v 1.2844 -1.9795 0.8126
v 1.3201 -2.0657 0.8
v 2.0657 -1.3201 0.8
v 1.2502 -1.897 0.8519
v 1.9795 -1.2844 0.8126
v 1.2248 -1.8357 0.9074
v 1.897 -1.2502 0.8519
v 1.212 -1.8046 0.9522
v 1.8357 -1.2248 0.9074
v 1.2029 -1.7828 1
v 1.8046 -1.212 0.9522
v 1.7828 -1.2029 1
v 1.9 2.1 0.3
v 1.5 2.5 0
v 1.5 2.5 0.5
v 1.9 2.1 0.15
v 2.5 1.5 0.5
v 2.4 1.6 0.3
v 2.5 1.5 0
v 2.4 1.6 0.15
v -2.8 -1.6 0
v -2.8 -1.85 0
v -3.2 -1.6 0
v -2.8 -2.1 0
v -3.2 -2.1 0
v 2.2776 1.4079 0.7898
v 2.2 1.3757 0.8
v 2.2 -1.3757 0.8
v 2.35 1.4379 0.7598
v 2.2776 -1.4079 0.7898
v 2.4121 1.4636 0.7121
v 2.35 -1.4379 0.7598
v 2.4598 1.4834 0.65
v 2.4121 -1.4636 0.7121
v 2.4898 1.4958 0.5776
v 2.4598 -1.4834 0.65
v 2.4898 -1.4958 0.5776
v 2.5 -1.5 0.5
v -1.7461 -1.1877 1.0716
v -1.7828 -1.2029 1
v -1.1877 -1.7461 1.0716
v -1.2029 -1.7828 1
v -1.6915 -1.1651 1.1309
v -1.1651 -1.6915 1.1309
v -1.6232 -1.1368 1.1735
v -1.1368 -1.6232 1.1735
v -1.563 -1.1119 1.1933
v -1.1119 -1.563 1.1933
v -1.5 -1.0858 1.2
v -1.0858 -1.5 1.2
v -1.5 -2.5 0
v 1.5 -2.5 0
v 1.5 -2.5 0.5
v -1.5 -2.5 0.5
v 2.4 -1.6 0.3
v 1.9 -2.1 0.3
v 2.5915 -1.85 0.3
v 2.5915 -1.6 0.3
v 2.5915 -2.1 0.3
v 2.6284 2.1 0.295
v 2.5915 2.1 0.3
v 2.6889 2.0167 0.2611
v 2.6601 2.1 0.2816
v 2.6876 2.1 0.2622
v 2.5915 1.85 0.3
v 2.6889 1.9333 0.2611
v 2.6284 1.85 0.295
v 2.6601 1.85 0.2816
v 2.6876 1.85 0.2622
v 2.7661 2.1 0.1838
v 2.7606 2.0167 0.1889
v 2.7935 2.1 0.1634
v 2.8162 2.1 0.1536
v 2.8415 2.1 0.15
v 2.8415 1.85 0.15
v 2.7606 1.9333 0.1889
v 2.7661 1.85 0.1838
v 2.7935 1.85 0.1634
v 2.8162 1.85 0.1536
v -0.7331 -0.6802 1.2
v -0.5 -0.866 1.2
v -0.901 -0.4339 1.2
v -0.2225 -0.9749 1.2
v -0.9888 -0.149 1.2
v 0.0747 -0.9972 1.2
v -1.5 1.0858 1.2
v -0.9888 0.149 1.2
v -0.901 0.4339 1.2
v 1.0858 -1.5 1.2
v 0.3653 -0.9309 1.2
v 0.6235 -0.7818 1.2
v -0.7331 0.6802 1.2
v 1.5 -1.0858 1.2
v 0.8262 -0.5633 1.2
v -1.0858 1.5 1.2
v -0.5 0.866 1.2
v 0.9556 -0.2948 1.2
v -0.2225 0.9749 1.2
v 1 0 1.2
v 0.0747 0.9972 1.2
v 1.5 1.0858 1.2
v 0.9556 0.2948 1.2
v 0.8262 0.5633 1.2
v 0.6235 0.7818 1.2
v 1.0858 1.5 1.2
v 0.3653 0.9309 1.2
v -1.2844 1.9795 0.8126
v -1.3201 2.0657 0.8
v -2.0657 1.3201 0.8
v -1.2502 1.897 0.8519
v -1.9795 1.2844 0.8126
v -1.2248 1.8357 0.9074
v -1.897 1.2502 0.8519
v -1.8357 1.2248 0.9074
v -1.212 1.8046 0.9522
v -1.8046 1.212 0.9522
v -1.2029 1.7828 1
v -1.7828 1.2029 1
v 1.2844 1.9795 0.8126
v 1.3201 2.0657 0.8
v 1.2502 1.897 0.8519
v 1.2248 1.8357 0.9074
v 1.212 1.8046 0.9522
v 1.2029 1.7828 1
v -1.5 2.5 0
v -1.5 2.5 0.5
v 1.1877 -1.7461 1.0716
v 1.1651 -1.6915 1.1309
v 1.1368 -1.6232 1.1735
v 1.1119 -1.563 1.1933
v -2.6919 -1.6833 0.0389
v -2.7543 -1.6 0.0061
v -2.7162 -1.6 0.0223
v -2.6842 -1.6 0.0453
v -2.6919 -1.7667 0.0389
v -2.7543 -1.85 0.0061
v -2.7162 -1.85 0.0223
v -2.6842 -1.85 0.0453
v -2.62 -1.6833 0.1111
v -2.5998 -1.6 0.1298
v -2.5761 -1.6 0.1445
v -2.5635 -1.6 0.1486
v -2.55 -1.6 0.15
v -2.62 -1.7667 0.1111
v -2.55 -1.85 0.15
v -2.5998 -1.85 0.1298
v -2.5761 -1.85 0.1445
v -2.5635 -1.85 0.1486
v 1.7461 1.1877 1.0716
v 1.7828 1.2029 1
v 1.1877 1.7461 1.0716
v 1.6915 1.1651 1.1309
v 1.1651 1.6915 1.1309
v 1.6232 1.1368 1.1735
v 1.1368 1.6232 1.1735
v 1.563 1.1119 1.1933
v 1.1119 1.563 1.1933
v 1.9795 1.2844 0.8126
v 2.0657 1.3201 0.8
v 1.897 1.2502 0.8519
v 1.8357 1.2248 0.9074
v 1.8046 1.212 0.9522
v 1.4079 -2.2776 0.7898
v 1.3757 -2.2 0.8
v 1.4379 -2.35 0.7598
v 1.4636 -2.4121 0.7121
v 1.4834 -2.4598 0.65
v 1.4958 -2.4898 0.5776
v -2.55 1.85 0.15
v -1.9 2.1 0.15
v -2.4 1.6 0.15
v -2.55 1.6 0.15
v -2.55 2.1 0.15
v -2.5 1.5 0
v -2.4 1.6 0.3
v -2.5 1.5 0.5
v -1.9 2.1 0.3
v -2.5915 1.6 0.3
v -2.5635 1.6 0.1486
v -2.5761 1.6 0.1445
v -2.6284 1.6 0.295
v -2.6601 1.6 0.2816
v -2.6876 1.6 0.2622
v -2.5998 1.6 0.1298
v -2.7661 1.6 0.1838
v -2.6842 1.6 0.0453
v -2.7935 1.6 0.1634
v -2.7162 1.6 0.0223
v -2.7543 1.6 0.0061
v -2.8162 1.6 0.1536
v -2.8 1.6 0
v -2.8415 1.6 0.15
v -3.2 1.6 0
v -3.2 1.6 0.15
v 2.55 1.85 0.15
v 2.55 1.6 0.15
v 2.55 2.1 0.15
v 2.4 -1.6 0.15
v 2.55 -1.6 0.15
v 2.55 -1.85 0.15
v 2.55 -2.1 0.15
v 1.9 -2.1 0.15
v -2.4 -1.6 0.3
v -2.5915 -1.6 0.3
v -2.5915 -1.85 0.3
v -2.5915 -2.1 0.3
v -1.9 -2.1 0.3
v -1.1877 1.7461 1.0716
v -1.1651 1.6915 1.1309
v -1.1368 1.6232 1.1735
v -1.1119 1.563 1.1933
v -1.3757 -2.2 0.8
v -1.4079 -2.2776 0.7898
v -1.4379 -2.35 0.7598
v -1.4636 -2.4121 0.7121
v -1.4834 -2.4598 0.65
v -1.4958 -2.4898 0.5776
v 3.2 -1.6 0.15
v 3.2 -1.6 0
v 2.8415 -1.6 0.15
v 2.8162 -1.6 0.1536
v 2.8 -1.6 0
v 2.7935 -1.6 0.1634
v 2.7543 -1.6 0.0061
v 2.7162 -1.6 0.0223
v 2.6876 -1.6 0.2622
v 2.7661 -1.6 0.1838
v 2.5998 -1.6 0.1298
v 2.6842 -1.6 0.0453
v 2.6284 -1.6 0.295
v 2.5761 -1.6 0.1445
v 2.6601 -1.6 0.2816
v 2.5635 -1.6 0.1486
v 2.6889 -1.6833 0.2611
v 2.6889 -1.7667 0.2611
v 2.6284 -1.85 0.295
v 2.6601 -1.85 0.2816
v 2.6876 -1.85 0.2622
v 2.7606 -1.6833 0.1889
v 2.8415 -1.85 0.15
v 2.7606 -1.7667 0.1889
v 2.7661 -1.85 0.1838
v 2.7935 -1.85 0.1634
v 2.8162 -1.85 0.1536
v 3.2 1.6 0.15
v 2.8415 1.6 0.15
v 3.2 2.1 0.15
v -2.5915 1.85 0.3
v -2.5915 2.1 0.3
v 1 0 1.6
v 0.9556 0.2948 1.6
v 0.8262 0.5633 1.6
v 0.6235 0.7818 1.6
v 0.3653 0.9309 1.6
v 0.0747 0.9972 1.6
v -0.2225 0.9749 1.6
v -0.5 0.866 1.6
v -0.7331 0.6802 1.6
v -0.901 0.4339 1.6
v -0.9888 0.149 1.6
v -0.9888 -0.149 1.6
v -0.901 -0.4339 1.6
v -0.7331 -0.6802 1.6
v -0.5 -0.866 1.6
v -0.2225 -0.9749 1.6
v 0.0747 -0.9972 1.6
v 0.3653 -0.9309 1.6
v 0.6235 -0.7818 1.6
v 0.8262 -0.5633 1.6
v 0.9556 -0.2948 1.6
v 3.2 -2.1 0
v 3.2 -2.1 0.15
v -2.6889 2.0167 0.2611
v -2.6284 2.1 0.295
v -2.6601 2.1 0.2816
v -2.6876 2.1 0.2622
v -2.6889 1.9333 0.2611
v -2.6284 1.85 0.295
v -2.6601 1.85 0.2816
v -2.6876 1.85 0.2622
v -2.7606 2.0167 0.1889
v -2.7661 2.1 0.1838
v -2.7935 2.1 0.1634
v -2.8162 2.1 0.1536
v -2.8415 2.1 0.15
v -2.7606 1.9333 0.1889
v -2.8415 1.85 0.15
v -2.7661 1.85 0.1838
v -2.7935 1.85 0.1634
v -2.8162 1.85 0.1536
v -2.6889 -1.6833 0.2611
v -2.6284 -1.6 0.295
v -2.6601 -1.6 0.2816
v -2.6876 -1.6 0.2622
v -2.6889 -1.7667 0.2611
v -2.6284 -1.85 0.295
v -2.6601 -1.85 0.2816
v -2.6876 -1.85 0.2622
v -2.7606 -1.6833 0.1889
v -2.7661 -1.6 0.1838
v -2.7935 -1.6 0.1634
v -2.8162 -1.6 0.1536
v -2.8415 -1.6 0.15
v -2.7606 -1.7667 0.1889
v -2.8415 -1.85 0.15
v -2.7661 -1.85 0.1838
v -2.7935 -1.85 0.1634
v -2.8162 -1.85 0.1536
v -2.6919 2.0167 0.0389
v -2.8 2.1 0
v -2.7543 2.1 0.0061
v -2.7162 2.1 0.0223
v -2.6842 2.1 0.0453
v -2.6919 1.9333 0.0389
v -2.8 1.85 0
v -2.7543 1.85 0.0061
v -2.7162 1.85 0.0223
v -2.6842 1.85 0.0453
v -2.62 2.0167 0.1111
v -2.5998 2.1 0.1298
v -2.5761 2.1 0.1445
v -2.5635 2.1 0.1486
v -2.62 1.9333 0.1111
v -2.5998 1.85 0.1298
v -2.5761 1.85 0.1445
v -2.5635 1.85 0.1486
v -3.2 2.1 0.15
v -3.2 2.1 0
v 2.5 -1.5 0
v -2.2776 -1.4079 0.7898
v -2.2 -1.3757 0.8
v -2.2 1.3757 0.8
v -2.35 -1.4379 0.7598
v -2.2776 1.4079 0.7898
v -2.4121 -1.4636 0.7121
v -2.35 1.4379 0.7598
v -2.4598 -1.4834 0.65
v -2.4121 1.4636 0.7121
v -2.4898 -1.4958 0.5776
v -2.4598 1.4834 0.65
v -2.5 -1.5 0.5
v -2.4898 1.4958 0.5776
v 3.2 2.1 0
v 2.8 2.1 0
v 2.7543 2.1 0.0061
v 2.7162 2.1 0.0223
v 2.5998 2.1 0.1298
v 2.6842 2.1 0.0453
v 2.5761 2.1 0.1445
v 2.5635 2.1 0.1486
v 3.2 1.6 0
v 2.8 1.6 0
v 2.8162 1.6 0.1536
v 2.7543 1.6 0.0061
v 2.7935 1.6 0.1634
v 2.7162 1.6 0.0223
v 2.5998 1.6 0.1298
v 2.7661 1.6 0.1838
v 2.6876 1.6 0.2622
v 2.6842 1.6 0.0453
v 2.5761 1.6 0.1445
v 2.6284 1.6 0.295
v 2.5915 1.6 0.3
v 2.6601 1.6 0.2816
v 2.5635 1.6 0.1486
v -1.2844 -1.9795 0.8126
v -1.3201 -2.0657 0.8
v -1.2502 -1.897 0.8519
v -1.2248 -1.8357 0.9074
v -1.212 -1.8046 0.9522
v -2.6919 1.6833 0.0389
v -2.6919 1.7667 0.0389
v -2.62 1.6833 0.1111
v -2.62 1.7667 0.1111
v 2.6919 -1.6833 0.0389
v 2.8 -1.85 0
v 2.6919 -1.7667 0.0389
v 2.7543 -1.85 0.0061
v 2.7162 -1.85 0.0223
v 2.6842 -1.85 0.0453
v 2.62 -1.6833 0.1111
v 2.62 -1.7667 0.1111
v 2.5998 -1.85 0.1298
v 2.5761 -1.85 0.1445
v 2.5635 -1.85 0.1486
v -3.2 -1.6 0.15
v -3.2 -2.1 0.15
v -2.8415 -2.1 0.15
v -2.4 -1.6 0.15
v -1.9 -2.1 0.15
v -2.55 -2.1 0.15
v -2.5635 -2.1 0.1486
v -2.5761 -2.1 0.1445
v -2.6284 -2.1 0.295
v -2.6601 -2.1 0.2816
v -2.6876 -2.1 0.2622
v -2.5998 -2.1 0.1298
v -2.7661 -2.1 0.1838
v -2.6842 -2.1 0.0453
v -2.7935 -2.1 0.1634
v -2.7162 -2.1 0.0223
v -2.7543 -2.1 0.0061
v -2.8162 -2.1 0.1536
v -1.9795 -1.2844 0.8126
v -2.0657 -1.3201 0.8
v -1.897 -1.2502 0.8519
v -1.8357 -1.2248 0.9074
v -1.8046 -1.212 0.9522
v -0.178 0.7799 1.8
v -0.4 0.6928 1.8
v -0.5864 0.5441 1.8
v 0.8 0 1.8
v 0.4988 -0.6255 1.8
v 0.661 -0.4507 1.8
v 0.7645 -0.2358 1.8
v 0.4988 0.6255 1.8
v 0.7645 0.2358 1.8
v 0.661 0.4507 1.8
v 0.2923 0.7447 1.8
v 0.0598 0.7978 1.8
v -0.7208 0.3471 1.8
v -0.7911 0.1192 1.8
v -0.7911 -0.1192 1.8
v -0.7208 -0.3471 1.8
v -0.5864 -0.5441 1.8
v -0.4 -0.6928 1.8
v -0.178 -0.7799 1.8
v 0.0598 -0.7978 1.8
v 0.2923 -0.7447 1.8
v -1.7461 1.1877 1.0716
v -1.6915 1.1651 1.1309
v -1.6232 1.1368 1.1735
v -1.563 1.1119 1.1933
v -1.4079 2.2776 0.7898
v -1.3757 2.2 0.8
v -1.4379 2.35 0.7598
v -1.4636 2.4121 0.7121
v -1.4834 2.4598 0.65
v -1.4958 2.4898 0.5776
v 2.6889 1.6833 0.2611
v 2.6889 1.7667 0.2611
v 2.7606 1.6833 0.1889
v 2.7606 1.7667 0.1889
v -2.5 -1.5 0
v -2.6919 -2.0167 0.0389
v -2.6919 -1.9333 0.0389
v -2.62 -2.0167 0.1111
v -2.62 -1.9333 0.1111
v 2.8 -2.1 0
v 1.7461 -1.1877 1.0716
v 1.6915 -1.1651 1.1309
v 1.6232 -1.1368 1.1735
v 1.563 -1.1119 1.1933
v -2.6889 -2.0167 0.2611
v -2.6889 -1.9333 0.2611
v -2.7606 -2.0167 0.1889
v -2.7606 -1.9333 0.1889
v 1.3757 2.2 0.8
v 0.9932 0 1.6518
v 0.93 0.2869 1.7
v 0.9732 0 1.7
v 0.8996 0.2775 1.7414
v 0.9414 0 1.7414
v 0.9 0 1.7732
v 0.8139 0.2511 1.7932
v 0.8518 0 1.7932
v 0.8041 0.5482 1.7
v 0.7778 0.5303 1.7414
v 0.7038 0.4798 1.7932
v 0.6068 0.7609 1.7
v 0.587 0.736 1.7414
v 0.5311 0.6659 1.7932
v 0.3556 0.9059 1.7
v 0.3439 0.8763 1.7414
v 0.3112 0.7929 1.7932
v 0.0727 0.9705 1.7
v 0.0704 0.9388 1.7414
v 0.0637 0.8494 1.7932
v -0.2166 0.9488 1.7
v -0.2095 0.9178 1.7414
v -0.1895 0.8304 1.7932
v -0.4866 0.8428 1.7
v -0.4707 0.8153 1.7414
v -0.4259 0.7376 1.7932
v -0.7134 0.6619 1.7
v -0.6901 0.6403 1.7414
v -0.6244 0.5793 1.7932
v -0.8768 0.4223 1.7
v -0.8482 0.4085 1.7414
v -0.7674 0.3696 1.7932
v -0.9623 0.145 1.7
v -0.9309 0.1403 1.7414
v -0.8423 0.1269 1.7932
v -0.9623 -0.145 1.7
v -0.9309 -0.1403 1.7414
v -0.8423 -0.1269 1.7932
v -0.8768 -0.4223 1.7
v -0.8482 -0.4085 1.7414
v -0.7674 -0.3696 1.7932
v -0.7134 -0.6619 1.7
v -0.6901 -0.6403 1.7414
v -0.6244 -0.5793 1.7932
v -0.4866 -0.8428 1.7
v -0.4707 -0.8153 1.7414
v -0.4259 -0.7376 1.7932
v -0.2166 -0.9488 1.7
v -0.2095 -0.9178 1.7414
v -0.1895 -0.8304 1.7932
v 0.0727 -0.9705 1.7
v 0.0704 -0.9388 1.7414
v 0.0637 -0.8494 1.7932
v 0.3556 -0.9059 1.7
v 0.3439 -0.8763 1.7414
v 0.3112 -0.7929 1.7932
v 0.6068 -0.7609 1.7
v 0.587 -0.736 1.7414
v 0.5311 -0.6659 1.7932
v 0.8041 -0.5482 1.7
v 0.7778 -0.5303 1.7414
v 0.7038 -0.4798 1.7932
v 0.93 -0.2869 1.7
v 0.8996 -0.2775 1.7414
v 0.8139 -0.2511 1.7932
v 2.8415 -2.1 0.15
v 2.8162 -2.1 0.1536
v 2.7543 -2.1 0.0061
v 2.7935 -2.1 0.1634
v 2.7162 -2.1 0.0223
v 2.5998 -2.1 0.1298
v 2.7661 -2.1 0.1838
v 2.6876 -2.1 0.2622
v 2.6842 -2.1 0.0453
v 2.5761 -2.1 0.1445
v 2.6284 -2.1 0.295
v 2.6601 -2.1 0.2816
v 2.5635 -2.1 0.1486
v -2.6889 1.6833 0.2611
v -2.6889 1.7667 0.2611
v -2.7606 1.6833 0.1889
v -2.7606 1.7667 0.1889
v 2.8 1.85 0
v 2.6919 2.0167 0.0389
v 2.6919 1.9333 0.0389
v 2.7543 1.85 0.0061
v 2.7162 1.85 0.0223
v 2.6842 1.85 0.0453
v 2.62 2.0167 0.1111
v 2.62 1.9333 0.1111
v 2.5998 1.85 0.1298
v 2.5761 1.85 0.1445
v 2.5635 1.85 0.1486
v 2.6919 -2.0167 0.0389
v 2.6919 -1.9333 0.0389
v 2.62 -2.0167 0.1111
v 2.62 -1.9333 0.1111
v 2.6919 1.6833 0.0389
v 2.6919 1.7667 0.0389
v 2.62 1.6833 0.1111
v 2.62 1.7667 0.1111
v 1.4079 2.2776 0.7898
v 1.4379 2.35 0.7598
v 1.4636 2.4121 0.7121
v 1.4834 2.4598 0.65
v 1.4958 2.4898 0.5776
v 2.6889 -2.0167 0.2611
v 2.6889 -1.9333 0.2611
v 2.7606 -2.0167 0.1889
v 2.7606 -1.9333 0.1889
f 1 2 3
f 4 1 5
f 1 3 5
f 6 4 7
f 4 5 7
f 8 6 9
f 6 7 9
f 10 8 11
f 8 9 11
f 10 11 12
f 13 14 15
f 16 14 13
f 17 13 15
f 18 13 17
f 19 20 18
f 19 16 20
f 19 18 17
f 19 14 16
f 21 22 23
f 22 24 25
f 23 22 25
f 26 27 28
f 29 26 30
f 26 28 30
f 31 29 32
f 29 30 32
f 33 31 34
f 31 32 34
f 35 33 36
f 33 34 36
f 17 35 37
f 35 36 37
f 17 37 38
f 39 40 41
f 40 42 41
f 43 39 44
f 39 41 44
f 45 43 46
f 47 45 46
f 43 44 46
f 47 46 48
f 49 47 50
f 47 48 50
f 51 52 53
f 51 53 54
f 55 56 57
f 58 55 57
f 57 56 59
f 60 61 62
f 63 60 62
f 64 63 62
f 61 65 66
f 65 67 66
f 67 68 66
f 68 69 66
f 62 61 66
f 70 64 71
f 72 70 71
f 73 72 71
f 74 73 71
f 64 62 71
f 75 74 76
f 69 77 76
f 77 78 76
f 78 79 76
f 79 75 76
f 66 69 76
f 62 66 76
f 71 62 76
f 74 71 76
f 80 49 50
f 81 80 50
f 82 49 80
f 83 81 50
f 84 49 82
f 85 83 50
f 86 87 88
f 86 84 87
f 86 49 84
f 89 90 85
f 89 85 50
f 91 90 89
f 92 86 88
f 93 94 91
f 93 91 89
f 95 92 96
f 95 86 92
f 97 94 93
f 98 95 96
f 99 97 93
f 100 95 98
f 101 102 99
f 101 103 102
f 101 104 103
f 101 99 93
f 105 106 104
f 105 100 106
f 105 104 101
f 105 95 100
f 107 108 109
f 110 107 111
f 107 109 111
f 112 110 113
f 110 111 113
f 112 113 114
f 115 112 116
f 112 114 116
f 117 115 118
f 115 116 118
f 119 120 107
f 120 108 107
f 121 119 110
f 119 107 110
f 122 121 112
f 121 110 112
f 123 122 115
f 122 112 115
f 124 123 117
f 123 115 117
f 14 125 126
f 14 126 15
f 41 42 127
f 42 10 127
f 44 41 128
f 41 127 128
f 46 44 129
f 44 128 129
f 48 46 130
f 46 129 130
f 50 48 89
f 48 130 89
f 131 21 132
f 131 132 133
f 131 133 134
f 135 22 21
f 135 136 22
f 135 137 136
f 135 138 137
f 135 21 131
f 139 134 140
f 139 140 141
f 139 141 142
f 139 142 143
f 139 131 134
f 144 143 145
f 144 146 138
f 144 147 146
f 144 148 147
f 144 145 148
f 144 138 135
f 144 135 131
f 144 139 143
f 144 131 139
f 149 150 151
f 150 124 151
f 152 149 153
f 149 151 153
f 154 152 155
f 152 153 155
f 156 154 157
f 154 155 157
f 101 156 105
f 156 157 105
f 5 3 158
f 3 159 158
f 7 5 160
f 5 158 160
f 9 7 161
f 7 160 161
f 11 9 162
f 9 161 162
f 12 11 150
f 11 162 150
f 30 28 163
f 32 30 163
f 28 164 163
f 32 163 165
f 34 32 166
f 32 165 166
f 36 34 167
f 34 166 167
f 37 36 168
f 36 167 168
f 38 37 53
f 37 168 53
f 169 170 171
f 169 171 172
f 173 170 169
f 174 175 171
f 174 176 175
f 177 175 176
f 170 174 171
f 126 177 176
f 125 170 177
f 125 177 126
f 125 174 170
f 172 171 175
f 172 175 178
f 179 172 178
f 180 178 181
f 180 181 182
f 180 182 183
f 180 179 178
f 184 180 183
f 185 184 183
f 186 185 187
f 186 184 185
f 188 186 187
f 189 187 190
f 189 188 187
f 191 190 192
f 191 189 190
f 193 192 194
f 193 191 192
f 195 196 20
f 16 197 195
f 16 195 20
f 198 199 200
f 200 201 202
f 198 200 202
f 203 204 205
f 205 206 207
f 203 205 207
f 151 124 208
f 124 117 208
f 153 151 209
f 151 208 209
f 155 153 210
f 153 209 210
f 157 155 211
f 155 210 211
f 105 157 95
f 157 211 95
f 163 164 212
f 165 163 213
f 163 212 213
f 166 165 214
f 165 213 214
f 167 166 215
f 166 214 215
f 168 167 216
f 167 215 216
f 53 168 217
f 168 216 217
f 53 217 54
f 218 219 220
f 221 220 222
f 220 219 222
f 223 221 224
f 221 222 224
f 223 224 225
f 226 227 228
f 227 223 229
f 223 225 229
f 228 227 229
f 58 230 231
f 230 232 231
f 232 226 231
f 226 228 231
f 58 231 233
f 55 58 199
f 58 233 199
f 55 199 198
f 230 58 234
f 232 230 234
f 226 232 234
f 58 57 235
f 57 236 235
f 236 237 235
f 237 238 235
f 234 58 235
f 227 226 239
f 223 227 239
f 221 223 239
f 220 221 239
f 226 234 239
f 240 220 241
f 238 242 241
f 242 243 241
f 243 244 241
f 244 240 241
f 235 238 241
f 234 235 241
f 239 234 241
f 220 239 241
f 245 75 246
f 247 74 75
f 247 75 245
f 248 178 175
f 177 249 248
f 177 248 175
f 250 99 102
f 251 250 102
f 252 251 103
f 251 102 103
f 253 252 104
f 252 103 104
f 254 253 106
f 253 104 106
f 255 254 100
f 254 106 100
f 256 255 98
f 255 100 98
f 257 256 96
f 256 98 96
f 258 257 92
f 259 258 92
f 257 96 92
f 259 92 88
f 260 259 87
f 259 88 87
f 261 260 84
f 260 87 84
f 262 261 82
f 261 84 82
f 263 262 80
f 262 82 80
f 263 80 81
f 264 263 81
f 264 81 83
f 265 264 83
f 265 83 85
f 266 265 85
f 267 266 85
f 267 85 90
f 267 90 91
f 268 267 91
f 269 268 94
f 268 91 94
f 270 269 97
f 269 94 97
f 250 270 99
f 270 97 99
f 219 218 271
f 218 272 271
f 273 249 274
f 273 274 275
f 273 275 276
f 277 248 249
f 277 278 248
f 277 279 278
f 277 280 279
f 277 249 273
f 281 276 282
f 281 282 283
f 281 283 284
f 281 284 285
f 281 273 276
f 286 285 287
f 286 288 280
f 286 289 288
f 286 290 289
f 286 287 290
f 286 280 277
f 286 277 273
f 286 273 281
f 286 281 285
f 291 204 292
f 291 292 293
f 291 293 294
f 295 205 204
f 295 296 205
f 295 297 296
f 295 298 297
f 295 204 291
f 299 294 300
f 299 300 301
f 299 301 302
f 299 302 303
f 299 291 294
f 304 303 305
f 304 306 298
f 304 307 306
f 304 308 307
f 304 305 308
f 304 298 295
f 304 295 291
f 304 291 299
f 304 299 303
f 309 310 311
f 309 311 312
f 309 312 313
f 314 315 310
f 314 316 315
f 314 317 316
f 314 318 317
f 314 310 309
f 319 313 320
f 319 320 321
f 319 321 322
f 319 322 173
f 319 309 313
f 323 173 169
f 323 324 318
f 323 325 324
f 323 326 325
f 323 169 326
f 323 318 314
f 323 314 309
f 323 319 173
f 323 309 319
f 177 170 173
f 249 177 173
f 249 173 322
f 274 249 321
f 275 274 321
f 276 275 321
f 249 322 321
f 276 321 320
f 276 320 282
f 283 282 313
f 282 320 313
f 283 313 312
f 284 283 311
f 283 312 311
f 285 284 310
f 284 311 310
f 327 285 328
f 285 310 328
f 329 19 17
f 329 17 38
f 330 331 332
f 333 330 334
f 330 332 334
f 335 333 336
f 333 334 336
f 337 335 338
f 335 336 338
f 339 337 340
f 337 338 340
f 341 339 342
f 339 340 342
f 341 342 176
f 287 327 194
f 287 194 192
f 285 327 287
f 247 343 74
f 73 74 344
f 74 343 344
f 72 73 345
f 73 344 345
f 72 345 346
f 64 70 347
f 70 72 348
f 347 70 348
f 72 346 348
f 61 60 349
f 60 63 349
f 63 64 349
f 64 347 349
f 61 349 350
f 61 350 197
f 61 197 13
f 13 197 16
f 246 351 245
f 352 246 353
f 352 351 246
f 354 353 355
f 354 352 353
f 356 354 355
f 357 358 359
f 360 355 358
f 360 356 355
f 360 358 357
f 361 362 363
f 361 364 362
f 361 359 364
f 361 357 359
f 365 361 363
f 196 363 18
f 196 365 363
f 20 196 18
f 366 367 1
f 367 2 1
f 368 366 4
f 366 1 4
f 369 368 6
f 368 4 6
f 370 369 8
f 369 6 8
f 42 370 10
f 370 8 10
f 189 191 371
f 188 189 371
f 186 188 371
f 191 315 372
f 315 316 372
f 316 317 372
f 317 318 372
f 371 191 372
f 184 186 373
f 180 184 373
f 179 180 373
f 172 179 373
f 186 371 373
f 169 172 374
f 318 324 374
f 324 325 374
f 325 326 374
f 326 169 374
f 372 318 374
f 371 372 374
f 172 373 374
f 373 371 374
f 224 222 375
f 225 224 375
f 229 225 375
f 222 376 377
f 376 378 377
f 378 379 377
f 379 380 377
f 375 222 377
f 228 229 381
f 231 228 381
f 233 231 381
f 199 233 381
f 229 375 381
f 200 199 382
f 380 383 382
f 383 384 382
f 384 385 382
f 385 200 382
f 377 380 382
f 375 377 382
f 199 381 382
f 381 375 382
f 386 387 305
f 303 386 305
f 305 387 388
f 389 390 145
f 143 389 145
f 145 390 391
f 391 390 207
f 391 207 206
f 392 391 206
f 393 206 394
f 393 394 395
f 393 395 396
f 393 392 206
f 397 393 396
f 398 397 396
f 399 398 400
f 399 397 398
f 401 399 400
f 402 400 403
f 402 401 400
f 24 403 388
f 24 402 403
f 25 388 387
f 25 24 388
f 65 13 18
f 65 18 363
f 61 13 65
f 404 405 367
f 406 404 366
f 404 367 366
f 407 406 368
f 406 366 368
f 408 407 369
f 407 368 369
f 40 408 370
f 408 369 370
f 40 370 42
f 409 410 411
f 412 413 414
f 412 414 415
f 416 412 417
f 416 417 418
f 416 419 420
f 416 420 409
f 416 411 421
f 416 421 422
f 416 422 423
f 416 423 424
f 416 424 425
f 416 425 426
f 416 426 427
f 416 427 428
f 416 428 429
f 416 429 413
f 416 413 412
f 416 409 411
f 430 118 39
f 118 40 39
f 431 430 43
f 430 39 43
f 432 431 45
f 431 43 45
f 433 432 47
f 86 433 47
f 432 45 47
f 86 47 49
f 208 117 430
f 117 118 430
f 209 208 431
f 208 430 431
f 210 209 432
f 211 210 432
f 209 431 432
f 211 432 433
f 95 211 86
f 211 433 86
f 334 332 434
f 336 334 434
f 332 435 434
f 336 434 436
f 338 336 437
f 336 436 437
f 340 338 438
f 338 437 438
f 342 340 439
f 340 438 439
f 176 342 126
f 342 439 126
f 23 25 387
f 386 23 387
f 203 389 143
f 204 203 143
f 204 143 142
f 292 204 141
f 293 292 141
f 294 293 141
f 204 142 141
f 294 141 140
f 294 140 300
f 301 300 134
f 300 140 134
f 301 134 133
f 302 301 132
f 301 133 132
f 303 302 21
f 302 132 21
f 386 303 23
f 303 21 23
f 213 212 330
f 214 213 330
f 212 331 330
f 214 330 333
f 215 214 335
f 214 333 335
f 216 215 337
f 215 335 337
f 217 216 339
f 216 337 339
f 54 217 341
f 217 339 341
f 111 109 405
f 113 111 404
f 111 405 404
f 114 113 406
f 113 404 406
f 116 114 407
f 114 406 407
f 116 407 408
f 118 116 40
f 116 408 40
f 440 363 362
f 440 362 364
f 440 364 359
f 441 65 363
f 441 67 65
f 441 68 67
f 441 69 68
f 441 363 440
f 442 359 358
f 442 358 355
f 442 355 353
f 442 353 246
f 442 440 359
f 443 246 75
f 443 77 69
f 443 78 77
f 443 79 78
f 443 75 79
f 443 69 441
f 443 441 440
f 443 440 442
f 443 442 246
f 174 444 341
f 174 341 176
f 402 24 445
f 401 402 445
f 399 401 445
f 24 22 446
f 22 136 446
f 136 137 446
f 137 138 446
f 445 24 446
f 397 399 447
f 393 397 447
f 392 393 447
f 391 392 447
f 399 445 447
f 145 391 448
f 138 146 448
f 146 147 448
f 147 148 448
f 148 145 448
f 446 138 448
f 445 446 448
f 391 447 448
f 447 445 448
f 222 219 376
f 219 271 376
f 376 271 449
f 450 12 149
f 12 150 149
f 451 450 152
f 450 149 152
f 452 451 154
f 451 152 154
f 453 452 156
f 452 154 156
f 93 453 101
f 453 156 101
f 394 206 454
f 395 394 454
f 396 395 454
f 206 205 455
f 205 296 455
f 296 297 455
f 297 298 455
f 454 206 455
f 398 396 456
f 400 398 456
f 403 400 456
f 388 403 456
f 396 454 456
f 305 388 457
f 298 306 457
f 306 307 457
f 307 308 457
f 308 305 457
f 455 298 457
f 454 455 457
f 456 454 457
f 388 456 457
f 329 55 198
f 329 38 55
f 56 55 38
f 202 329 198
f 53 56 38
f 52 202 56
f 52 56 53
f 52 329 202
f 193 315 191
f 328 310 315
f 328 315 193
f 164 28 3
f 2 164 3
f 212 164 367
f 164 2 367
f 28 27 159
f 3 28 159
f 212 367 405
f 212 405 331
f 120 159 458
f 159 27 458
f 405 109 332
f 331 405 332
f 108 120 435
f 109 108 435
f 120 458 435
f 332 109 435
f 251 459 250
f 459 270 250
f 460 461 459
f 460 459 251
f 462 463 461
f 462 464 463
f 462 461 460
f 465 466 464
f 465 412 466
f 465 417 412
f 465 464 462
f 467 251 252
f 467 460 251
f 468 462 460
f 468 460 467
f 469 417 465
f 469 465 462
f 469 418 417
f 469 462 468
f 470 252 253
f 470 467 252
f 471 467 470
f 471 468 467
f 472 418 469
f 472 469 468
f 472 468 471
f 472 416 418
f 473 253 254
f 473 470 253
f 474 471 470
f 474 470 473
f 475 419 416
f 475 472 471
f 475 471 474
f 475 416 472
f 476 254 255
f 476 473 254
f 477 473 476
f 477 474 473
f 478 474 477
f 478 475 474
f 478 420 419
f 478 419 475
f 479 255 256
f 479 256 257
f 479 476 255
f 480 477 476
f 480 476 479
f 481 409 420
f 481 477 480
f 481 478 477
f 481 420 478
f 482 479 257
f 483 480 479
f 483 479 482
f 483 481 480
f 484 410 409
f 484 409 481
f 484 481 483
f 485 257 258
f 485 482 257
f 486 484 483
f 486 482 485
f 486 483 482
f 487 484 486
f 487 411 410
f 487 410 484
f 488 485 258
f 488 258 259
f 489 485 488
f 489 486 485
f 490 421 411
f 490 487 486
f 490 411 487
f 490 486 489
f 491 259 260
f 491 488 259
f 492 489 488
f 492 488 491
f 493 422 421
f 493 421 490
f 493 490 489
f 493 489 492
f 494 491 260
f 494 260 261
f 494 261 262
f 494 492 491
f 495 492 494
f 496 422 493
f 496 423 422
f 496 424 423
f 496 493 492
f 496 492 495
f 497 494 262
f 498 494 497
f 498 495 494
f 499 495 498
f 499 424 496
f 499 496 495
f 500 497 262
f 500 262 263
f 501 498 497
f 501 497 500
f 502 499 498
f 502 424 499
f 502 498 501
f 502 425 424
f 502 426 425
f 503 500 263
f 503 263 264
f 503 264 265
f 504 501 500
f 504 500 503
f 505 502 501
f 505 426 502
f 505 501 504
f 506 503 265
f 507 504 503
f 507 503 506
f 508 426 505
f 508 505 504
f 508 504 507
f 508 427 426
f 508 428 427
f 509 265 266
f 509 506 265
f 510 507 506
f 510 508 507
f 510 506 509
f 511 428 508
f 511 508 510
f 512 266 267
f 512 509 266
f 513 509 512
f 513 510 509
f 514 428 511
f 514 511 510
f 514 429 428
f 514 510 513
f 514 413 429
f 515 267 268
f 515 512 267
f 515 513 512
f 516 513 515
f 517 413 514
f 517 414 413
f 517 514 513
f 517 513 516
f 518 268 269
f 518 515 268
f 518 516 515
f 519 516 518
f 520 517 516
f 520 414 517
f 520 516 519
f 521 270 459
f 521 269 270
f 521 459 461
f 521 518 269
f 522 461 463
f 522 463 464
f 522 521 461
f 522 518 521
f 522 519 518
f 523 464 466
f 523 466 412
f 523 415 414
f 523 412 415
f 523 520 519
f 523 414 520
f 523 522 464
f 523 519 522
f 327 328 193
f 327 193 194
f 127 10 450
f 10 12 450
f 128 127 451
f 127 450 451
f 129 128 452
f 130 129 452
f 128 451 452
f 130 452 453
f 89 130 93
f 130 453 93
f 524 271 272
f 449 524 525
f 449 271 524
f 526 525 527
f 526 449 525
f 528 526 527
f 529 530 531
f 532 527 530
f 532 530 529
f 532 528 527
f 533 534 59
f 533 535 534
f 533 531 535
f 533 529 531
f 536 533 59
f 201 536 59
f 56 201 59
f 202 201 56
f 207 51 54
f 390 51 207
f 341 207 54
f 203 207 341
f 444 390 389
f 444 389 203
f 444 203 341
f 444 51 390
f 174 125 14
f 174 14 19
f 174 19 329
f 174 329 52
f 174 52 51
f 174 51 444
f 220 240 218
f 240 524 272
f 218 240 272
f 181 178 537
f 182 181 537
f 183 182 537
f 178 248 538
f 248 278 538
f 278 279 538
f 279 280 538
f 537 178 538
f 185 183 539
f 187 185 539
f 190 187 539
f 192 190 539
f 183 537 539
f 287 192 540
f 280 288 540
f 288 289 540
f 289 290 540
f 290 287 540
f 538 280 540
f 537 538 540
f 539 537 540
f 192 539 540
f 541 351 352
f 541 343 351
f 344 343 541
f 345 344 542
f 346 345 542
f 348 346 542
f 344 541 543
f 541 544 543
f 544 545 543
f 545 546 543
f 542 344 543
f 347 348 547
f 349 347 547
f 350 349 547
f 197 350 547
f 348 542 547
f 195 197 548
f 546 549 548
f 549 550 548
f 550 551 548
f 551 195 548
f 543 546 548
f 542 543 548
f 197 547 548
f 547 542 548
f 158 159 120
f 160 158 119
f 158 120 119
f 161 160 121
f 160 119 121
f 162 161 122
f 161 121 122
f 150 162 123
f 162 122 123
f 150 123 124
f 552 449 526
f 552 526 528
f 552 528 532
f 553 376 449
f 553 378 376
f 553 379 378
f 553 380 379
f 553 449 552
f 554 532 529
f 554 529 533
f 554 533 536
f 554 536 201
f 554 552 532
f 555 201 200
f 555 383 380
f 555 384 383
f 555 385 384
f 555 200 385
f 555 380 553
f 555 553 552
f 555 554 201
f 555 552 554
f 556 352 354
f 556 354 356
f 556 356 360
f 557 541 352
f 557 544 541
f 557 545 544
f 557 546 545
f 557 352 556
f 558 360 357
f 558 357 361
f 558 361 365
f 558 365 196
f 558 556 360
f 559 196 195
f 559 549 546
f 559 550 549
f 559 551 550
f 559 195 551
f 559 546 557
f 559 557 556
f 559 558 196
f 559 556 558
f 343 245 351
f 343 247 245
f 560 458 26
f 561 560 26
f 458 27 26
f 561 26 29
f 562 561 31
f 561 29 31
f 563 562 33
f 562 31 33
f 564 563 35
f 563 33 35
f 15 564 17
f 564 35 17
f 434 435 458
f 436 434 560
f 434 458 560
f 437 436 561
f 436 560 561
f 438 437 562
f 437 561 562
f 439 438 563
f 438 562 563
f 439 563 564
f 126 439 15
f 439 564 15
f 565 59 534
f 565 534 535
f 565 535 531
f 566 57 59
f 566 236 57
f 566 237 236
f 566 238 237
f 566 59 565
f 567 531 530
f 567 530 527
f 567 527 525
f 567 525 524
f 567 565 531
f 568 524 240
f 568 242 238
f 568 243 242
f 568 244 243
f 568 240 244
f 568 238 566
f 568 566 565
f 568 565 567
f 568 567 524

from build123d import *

# Parameters (mm, degrees)
BOSS_EXTRUDE1_DEPTH = 0.8
BOSS_EXTRUDE2_DEPTH = 0.4
SKETCH3_R           = 1
BOSS_EXTRUDE3_DEPTH = 0.6
FILLET1_R           = 0.3
FILLET2_R           = 0.3
FILLET3_R           = 0.3
FILLET4_R           = 0.2
BOSS_EXTRUDE4_DEPTH = 0.25


with BuildPart() as part:
    # Sketch1 → Boss-Extrude1 (new body)
    with BuildSketch(Plane.XY):
        Polygon((-1.5, 2.5), (1.5, 2.5), (2.5, 1.5), (2.5, -1.5), (1.5, -2.5), (-1.5, -2.5), (-2.5, -1.5), (-2.5, 1.5), align=None)
    extrude(amount=BOSS_EXTRUDE1_DEPTH)

    # Sketch2 → Boss-Extrude2 (add)
    with BuildSketch(Plane.XY.offset(0.8)):
        Polygon((-1.210050506, 1.8), (-1.8, 1.210050506), (-1.8, -1.210050506), (-1.210050506, -1.8), (1.210050506, -1.8), (1.8, -1.210050506), (1.8, 1.210050506), (1.210050506, 1.8), align=None)
    extrude(amount=BOSS_EXTRUDE2_DEPTH)

    # Sketch3 → Boss-Extrude3 (add)
    with BuildSketch(Plane.XY.offset(1.2)):
        Circle(SKETCH3_R)
    extrude(amount=BOSS_EXTRUDE3_DEPTH)

    # Fillet1
    fillet1_edges = [part.edges().sort_by_distance(p)[0] for p in [
        (1.505025253, 1.505025253, 1.2),
        (0, 1.8, 1.2),
        (-1.505025253, 1.505025253, 1.2),
        (-1.8, 0, 1.2),
        (-1.505025253, -1.505025253, 1.2),
        (0, -1.8, 1.2),
        (1.505025253, -1.505025253, 1.2),
        (1.8, 0, 1.2),
    ]]
    fillet(fillet1_edges, radius=FILLET1_R)

    # Fillet2
    fillet2_edges = [part.edges().sort_by_distance(p)[0] for p in [
        (-2, 2, 0.8),
        (-2.5, 0, 0.8),
        (-2, -2, 0.8),
        (0, -2.5, 0.8),
        (2, -2, 0.8),
        (2.5, 0, 0.8),
        (2, 2, 0.8),
        (0, 2.5, 0.8),
    ]]
    fillet(fillet2_edges, radius=FILLET2_R)

    # Fillet3
    fillet3_edges = [part.edges().sort_by_distance(p)[0] for p in [
        (0, -1.8, 0.8),
        (1.505025253, -1.505025253, 0.8),
        (1.8, 0, 0.8),
        (1.505025253, 1.505025253, 0.8),
        (0, 1.8, 0.8),
        (-1.505025253, 1.505025253, 0.8),
        (-1.8, 0, 0.8),
        (-1.505025253, -1.505025253, 0.8),
    ]]
    fillet(fillet3_edges, radius=FILLET3_R)

    # Fillet4
    fillet4_edges = [part.edges().sort_by_distance(p)[0] for p in [
        (-1, 0, 1.8),
    ]]
    fillet(fillet4_edges, radius=FILLET4_R)

    # Sketch4 → Boss-Extrude4 (add, symmetric)
    with BuildSketch(Plane(origin=(0, 1.85, 0), x_dir=(1, 0, 0), z_dir=(0, 1, 0))):
        with BuildLine():
            Line((0, -0.15), (-2.55, -0.15))
            add(Edge.make_bspline(
                [(-2.8, 0), (-2.662431202, 0), (-2.630462892, -0.15), (-2.55, -0.15)],
                knots=[0, 0, 0, 0, 1, 1, 1, 1], degree=3))
            Line((-2.8, 0), (-3.2, 0))
            Line((-3.2, 0), (-3.2, -0.15))
            Line((-3.2, -0.15), (-2.841547595, -0.15))
            add(Edge.make_bspline(
                [(-2.591547595, -0.3), (-2.713318055, -0.3), (-2.744365063, -0.15), (-2.841547595, -0.15)],
                knots=[0, 0, 0, 0, 1, 1, 1, 1], degree=3))
            Line((-2.591547595, -0.3), (0, -0.3))
            Line((0, -0.3), (2.591547595, -0.3))
            add(Edge.make_bspline(
                [(2.591547595, -0.3), (2.713318055, -0.3), (2.744365063, -0.15), (2.841547595, -0.15)],
                knots=[0, 0, 0, 0, 1, 1, 1, 1], degree=3))
            Line((2.841547595, -0.15), (3.2, -0.15))
            Line((3.2, -0.15), (3.2, 0))
            Line((3.2, 0), (2.8, 0))
            add(Edge.make_bspline(
                [(2.8, 0), (2.662431202, 0), (2.630462892, -0.15), (2.55, -0.15)],
                knots=[0, 0, 0, 0, 1, 1, 1, 1], degree=3))
            Line((2.55, -0.15), (0, -0.15))
        make_face()
    boss_extrude4 = extrude(amount=BOSS_EXTRUDE4_DEPTH, both=True)

    # Mirror1: Boss-Extrude4 across plane
    add(boss_extrude4.mirror(Plane.ZX))


solid = part.part
